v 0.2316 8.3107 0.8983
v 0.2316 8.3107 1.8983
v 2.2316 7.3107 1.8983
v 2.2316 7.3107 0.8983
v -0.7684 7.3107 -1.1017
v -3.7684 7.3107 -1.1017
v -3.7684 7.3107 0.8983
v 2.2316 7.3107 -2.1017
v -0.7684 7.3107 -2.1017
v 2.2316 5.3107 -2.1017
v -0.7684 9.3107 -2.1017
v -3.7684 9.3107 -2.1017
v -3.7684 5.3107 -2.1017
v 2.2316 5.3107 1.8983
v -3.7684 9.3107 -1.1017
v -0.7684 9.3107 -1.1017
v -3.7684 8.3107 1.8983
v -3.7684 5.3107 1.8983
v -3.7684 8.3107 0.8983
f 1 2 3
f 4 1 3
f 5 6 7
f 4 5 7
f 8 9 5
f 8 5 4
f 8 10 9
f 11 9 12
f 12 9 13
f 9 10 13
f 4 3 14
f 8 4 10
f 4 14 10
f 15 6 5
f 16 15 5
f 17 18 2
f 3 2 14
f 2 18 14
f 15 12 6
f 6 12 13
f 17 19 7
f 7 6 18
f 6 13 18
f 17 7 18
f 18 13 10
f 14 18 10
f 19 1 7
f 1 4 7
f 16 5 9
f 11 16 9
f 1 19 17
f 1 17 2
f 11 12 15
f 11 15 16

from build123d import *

# Parameters (mm, degrees)
SKETCH_1_W          = 30
SKETCH_1_H          = 20
EXTRUDE_1_DEPTH     = 10
SKETCH_1_3_W        = 30
SKETCH_1_3_H        = 5
EXTRUDE_2_DEPTH     = 15
SKETCH_1_4_W        = 15
SKETCH_1_4_H        = 5
EXTRUDE_3_DEPTH     = 20
CUT_EXTRUDE_1_DEPTH = 20
SCALE_1_SCALE       = 0.2


with BuildPart() as part:
    # 草圖1 → 填料-伸長1 (new body)
    with BuildSketch(Plane(origin=(0, 0, 0), x_dir=(1, 0, 0), z_dir=(0, 1, 0))):
        Rectangle(SKETCH_1_W, SKETCH_1_H)
    extrude(amount=EXTRUDE_1_DEPTH)

    # 草圖1<3> → 填料-伸長2 (add)
    with BuildSketch(Plane(origin=(0, 0, 0), x_dir=(1, 0, 0), z_dir=(0, 1, 0))):
        with Locations((0, -7.5)):
            Rectangle(SKETCH_1_3_W, SKETCH_1_3_H)
    extrude(amount=EXTRUDE_2_DEPTH)

    # 草圖1<4> → 填料-伸長3 (add)
    with BuildSketch(Plane(origin=(0, 0, 0), x_dir=(1, 0, 0), z_dir=(0, 1, 0))):
        with Locations((-7.5, 7.5)):
            Rectangle(SKETCH_1_4_W, SKETCH_1_4_H)
    extrude(amount=EXTRUDE_3_DEPTH)

    # 草圖2 → 除料-伸長1 (cut)
    with BuildSketch(Plane.XY.offset(10)):
        Polygon((5, 15), (15, 10), (15, 15), align=None)
    extrude(amount=-CUT_EXTRUDE_1_DEPTH, mode=Mode.SUBTRACT)


with BuildPart() as part_1:
    # 縮放比例1: scaled about (-0.960451977, 6.638418079, -0.127118644)
    add(part.part.scale(SCALE_1_SCALE).moved(Location((-0.768361582, 5.310734463, -0.101694915))))


solid = part_1.part
